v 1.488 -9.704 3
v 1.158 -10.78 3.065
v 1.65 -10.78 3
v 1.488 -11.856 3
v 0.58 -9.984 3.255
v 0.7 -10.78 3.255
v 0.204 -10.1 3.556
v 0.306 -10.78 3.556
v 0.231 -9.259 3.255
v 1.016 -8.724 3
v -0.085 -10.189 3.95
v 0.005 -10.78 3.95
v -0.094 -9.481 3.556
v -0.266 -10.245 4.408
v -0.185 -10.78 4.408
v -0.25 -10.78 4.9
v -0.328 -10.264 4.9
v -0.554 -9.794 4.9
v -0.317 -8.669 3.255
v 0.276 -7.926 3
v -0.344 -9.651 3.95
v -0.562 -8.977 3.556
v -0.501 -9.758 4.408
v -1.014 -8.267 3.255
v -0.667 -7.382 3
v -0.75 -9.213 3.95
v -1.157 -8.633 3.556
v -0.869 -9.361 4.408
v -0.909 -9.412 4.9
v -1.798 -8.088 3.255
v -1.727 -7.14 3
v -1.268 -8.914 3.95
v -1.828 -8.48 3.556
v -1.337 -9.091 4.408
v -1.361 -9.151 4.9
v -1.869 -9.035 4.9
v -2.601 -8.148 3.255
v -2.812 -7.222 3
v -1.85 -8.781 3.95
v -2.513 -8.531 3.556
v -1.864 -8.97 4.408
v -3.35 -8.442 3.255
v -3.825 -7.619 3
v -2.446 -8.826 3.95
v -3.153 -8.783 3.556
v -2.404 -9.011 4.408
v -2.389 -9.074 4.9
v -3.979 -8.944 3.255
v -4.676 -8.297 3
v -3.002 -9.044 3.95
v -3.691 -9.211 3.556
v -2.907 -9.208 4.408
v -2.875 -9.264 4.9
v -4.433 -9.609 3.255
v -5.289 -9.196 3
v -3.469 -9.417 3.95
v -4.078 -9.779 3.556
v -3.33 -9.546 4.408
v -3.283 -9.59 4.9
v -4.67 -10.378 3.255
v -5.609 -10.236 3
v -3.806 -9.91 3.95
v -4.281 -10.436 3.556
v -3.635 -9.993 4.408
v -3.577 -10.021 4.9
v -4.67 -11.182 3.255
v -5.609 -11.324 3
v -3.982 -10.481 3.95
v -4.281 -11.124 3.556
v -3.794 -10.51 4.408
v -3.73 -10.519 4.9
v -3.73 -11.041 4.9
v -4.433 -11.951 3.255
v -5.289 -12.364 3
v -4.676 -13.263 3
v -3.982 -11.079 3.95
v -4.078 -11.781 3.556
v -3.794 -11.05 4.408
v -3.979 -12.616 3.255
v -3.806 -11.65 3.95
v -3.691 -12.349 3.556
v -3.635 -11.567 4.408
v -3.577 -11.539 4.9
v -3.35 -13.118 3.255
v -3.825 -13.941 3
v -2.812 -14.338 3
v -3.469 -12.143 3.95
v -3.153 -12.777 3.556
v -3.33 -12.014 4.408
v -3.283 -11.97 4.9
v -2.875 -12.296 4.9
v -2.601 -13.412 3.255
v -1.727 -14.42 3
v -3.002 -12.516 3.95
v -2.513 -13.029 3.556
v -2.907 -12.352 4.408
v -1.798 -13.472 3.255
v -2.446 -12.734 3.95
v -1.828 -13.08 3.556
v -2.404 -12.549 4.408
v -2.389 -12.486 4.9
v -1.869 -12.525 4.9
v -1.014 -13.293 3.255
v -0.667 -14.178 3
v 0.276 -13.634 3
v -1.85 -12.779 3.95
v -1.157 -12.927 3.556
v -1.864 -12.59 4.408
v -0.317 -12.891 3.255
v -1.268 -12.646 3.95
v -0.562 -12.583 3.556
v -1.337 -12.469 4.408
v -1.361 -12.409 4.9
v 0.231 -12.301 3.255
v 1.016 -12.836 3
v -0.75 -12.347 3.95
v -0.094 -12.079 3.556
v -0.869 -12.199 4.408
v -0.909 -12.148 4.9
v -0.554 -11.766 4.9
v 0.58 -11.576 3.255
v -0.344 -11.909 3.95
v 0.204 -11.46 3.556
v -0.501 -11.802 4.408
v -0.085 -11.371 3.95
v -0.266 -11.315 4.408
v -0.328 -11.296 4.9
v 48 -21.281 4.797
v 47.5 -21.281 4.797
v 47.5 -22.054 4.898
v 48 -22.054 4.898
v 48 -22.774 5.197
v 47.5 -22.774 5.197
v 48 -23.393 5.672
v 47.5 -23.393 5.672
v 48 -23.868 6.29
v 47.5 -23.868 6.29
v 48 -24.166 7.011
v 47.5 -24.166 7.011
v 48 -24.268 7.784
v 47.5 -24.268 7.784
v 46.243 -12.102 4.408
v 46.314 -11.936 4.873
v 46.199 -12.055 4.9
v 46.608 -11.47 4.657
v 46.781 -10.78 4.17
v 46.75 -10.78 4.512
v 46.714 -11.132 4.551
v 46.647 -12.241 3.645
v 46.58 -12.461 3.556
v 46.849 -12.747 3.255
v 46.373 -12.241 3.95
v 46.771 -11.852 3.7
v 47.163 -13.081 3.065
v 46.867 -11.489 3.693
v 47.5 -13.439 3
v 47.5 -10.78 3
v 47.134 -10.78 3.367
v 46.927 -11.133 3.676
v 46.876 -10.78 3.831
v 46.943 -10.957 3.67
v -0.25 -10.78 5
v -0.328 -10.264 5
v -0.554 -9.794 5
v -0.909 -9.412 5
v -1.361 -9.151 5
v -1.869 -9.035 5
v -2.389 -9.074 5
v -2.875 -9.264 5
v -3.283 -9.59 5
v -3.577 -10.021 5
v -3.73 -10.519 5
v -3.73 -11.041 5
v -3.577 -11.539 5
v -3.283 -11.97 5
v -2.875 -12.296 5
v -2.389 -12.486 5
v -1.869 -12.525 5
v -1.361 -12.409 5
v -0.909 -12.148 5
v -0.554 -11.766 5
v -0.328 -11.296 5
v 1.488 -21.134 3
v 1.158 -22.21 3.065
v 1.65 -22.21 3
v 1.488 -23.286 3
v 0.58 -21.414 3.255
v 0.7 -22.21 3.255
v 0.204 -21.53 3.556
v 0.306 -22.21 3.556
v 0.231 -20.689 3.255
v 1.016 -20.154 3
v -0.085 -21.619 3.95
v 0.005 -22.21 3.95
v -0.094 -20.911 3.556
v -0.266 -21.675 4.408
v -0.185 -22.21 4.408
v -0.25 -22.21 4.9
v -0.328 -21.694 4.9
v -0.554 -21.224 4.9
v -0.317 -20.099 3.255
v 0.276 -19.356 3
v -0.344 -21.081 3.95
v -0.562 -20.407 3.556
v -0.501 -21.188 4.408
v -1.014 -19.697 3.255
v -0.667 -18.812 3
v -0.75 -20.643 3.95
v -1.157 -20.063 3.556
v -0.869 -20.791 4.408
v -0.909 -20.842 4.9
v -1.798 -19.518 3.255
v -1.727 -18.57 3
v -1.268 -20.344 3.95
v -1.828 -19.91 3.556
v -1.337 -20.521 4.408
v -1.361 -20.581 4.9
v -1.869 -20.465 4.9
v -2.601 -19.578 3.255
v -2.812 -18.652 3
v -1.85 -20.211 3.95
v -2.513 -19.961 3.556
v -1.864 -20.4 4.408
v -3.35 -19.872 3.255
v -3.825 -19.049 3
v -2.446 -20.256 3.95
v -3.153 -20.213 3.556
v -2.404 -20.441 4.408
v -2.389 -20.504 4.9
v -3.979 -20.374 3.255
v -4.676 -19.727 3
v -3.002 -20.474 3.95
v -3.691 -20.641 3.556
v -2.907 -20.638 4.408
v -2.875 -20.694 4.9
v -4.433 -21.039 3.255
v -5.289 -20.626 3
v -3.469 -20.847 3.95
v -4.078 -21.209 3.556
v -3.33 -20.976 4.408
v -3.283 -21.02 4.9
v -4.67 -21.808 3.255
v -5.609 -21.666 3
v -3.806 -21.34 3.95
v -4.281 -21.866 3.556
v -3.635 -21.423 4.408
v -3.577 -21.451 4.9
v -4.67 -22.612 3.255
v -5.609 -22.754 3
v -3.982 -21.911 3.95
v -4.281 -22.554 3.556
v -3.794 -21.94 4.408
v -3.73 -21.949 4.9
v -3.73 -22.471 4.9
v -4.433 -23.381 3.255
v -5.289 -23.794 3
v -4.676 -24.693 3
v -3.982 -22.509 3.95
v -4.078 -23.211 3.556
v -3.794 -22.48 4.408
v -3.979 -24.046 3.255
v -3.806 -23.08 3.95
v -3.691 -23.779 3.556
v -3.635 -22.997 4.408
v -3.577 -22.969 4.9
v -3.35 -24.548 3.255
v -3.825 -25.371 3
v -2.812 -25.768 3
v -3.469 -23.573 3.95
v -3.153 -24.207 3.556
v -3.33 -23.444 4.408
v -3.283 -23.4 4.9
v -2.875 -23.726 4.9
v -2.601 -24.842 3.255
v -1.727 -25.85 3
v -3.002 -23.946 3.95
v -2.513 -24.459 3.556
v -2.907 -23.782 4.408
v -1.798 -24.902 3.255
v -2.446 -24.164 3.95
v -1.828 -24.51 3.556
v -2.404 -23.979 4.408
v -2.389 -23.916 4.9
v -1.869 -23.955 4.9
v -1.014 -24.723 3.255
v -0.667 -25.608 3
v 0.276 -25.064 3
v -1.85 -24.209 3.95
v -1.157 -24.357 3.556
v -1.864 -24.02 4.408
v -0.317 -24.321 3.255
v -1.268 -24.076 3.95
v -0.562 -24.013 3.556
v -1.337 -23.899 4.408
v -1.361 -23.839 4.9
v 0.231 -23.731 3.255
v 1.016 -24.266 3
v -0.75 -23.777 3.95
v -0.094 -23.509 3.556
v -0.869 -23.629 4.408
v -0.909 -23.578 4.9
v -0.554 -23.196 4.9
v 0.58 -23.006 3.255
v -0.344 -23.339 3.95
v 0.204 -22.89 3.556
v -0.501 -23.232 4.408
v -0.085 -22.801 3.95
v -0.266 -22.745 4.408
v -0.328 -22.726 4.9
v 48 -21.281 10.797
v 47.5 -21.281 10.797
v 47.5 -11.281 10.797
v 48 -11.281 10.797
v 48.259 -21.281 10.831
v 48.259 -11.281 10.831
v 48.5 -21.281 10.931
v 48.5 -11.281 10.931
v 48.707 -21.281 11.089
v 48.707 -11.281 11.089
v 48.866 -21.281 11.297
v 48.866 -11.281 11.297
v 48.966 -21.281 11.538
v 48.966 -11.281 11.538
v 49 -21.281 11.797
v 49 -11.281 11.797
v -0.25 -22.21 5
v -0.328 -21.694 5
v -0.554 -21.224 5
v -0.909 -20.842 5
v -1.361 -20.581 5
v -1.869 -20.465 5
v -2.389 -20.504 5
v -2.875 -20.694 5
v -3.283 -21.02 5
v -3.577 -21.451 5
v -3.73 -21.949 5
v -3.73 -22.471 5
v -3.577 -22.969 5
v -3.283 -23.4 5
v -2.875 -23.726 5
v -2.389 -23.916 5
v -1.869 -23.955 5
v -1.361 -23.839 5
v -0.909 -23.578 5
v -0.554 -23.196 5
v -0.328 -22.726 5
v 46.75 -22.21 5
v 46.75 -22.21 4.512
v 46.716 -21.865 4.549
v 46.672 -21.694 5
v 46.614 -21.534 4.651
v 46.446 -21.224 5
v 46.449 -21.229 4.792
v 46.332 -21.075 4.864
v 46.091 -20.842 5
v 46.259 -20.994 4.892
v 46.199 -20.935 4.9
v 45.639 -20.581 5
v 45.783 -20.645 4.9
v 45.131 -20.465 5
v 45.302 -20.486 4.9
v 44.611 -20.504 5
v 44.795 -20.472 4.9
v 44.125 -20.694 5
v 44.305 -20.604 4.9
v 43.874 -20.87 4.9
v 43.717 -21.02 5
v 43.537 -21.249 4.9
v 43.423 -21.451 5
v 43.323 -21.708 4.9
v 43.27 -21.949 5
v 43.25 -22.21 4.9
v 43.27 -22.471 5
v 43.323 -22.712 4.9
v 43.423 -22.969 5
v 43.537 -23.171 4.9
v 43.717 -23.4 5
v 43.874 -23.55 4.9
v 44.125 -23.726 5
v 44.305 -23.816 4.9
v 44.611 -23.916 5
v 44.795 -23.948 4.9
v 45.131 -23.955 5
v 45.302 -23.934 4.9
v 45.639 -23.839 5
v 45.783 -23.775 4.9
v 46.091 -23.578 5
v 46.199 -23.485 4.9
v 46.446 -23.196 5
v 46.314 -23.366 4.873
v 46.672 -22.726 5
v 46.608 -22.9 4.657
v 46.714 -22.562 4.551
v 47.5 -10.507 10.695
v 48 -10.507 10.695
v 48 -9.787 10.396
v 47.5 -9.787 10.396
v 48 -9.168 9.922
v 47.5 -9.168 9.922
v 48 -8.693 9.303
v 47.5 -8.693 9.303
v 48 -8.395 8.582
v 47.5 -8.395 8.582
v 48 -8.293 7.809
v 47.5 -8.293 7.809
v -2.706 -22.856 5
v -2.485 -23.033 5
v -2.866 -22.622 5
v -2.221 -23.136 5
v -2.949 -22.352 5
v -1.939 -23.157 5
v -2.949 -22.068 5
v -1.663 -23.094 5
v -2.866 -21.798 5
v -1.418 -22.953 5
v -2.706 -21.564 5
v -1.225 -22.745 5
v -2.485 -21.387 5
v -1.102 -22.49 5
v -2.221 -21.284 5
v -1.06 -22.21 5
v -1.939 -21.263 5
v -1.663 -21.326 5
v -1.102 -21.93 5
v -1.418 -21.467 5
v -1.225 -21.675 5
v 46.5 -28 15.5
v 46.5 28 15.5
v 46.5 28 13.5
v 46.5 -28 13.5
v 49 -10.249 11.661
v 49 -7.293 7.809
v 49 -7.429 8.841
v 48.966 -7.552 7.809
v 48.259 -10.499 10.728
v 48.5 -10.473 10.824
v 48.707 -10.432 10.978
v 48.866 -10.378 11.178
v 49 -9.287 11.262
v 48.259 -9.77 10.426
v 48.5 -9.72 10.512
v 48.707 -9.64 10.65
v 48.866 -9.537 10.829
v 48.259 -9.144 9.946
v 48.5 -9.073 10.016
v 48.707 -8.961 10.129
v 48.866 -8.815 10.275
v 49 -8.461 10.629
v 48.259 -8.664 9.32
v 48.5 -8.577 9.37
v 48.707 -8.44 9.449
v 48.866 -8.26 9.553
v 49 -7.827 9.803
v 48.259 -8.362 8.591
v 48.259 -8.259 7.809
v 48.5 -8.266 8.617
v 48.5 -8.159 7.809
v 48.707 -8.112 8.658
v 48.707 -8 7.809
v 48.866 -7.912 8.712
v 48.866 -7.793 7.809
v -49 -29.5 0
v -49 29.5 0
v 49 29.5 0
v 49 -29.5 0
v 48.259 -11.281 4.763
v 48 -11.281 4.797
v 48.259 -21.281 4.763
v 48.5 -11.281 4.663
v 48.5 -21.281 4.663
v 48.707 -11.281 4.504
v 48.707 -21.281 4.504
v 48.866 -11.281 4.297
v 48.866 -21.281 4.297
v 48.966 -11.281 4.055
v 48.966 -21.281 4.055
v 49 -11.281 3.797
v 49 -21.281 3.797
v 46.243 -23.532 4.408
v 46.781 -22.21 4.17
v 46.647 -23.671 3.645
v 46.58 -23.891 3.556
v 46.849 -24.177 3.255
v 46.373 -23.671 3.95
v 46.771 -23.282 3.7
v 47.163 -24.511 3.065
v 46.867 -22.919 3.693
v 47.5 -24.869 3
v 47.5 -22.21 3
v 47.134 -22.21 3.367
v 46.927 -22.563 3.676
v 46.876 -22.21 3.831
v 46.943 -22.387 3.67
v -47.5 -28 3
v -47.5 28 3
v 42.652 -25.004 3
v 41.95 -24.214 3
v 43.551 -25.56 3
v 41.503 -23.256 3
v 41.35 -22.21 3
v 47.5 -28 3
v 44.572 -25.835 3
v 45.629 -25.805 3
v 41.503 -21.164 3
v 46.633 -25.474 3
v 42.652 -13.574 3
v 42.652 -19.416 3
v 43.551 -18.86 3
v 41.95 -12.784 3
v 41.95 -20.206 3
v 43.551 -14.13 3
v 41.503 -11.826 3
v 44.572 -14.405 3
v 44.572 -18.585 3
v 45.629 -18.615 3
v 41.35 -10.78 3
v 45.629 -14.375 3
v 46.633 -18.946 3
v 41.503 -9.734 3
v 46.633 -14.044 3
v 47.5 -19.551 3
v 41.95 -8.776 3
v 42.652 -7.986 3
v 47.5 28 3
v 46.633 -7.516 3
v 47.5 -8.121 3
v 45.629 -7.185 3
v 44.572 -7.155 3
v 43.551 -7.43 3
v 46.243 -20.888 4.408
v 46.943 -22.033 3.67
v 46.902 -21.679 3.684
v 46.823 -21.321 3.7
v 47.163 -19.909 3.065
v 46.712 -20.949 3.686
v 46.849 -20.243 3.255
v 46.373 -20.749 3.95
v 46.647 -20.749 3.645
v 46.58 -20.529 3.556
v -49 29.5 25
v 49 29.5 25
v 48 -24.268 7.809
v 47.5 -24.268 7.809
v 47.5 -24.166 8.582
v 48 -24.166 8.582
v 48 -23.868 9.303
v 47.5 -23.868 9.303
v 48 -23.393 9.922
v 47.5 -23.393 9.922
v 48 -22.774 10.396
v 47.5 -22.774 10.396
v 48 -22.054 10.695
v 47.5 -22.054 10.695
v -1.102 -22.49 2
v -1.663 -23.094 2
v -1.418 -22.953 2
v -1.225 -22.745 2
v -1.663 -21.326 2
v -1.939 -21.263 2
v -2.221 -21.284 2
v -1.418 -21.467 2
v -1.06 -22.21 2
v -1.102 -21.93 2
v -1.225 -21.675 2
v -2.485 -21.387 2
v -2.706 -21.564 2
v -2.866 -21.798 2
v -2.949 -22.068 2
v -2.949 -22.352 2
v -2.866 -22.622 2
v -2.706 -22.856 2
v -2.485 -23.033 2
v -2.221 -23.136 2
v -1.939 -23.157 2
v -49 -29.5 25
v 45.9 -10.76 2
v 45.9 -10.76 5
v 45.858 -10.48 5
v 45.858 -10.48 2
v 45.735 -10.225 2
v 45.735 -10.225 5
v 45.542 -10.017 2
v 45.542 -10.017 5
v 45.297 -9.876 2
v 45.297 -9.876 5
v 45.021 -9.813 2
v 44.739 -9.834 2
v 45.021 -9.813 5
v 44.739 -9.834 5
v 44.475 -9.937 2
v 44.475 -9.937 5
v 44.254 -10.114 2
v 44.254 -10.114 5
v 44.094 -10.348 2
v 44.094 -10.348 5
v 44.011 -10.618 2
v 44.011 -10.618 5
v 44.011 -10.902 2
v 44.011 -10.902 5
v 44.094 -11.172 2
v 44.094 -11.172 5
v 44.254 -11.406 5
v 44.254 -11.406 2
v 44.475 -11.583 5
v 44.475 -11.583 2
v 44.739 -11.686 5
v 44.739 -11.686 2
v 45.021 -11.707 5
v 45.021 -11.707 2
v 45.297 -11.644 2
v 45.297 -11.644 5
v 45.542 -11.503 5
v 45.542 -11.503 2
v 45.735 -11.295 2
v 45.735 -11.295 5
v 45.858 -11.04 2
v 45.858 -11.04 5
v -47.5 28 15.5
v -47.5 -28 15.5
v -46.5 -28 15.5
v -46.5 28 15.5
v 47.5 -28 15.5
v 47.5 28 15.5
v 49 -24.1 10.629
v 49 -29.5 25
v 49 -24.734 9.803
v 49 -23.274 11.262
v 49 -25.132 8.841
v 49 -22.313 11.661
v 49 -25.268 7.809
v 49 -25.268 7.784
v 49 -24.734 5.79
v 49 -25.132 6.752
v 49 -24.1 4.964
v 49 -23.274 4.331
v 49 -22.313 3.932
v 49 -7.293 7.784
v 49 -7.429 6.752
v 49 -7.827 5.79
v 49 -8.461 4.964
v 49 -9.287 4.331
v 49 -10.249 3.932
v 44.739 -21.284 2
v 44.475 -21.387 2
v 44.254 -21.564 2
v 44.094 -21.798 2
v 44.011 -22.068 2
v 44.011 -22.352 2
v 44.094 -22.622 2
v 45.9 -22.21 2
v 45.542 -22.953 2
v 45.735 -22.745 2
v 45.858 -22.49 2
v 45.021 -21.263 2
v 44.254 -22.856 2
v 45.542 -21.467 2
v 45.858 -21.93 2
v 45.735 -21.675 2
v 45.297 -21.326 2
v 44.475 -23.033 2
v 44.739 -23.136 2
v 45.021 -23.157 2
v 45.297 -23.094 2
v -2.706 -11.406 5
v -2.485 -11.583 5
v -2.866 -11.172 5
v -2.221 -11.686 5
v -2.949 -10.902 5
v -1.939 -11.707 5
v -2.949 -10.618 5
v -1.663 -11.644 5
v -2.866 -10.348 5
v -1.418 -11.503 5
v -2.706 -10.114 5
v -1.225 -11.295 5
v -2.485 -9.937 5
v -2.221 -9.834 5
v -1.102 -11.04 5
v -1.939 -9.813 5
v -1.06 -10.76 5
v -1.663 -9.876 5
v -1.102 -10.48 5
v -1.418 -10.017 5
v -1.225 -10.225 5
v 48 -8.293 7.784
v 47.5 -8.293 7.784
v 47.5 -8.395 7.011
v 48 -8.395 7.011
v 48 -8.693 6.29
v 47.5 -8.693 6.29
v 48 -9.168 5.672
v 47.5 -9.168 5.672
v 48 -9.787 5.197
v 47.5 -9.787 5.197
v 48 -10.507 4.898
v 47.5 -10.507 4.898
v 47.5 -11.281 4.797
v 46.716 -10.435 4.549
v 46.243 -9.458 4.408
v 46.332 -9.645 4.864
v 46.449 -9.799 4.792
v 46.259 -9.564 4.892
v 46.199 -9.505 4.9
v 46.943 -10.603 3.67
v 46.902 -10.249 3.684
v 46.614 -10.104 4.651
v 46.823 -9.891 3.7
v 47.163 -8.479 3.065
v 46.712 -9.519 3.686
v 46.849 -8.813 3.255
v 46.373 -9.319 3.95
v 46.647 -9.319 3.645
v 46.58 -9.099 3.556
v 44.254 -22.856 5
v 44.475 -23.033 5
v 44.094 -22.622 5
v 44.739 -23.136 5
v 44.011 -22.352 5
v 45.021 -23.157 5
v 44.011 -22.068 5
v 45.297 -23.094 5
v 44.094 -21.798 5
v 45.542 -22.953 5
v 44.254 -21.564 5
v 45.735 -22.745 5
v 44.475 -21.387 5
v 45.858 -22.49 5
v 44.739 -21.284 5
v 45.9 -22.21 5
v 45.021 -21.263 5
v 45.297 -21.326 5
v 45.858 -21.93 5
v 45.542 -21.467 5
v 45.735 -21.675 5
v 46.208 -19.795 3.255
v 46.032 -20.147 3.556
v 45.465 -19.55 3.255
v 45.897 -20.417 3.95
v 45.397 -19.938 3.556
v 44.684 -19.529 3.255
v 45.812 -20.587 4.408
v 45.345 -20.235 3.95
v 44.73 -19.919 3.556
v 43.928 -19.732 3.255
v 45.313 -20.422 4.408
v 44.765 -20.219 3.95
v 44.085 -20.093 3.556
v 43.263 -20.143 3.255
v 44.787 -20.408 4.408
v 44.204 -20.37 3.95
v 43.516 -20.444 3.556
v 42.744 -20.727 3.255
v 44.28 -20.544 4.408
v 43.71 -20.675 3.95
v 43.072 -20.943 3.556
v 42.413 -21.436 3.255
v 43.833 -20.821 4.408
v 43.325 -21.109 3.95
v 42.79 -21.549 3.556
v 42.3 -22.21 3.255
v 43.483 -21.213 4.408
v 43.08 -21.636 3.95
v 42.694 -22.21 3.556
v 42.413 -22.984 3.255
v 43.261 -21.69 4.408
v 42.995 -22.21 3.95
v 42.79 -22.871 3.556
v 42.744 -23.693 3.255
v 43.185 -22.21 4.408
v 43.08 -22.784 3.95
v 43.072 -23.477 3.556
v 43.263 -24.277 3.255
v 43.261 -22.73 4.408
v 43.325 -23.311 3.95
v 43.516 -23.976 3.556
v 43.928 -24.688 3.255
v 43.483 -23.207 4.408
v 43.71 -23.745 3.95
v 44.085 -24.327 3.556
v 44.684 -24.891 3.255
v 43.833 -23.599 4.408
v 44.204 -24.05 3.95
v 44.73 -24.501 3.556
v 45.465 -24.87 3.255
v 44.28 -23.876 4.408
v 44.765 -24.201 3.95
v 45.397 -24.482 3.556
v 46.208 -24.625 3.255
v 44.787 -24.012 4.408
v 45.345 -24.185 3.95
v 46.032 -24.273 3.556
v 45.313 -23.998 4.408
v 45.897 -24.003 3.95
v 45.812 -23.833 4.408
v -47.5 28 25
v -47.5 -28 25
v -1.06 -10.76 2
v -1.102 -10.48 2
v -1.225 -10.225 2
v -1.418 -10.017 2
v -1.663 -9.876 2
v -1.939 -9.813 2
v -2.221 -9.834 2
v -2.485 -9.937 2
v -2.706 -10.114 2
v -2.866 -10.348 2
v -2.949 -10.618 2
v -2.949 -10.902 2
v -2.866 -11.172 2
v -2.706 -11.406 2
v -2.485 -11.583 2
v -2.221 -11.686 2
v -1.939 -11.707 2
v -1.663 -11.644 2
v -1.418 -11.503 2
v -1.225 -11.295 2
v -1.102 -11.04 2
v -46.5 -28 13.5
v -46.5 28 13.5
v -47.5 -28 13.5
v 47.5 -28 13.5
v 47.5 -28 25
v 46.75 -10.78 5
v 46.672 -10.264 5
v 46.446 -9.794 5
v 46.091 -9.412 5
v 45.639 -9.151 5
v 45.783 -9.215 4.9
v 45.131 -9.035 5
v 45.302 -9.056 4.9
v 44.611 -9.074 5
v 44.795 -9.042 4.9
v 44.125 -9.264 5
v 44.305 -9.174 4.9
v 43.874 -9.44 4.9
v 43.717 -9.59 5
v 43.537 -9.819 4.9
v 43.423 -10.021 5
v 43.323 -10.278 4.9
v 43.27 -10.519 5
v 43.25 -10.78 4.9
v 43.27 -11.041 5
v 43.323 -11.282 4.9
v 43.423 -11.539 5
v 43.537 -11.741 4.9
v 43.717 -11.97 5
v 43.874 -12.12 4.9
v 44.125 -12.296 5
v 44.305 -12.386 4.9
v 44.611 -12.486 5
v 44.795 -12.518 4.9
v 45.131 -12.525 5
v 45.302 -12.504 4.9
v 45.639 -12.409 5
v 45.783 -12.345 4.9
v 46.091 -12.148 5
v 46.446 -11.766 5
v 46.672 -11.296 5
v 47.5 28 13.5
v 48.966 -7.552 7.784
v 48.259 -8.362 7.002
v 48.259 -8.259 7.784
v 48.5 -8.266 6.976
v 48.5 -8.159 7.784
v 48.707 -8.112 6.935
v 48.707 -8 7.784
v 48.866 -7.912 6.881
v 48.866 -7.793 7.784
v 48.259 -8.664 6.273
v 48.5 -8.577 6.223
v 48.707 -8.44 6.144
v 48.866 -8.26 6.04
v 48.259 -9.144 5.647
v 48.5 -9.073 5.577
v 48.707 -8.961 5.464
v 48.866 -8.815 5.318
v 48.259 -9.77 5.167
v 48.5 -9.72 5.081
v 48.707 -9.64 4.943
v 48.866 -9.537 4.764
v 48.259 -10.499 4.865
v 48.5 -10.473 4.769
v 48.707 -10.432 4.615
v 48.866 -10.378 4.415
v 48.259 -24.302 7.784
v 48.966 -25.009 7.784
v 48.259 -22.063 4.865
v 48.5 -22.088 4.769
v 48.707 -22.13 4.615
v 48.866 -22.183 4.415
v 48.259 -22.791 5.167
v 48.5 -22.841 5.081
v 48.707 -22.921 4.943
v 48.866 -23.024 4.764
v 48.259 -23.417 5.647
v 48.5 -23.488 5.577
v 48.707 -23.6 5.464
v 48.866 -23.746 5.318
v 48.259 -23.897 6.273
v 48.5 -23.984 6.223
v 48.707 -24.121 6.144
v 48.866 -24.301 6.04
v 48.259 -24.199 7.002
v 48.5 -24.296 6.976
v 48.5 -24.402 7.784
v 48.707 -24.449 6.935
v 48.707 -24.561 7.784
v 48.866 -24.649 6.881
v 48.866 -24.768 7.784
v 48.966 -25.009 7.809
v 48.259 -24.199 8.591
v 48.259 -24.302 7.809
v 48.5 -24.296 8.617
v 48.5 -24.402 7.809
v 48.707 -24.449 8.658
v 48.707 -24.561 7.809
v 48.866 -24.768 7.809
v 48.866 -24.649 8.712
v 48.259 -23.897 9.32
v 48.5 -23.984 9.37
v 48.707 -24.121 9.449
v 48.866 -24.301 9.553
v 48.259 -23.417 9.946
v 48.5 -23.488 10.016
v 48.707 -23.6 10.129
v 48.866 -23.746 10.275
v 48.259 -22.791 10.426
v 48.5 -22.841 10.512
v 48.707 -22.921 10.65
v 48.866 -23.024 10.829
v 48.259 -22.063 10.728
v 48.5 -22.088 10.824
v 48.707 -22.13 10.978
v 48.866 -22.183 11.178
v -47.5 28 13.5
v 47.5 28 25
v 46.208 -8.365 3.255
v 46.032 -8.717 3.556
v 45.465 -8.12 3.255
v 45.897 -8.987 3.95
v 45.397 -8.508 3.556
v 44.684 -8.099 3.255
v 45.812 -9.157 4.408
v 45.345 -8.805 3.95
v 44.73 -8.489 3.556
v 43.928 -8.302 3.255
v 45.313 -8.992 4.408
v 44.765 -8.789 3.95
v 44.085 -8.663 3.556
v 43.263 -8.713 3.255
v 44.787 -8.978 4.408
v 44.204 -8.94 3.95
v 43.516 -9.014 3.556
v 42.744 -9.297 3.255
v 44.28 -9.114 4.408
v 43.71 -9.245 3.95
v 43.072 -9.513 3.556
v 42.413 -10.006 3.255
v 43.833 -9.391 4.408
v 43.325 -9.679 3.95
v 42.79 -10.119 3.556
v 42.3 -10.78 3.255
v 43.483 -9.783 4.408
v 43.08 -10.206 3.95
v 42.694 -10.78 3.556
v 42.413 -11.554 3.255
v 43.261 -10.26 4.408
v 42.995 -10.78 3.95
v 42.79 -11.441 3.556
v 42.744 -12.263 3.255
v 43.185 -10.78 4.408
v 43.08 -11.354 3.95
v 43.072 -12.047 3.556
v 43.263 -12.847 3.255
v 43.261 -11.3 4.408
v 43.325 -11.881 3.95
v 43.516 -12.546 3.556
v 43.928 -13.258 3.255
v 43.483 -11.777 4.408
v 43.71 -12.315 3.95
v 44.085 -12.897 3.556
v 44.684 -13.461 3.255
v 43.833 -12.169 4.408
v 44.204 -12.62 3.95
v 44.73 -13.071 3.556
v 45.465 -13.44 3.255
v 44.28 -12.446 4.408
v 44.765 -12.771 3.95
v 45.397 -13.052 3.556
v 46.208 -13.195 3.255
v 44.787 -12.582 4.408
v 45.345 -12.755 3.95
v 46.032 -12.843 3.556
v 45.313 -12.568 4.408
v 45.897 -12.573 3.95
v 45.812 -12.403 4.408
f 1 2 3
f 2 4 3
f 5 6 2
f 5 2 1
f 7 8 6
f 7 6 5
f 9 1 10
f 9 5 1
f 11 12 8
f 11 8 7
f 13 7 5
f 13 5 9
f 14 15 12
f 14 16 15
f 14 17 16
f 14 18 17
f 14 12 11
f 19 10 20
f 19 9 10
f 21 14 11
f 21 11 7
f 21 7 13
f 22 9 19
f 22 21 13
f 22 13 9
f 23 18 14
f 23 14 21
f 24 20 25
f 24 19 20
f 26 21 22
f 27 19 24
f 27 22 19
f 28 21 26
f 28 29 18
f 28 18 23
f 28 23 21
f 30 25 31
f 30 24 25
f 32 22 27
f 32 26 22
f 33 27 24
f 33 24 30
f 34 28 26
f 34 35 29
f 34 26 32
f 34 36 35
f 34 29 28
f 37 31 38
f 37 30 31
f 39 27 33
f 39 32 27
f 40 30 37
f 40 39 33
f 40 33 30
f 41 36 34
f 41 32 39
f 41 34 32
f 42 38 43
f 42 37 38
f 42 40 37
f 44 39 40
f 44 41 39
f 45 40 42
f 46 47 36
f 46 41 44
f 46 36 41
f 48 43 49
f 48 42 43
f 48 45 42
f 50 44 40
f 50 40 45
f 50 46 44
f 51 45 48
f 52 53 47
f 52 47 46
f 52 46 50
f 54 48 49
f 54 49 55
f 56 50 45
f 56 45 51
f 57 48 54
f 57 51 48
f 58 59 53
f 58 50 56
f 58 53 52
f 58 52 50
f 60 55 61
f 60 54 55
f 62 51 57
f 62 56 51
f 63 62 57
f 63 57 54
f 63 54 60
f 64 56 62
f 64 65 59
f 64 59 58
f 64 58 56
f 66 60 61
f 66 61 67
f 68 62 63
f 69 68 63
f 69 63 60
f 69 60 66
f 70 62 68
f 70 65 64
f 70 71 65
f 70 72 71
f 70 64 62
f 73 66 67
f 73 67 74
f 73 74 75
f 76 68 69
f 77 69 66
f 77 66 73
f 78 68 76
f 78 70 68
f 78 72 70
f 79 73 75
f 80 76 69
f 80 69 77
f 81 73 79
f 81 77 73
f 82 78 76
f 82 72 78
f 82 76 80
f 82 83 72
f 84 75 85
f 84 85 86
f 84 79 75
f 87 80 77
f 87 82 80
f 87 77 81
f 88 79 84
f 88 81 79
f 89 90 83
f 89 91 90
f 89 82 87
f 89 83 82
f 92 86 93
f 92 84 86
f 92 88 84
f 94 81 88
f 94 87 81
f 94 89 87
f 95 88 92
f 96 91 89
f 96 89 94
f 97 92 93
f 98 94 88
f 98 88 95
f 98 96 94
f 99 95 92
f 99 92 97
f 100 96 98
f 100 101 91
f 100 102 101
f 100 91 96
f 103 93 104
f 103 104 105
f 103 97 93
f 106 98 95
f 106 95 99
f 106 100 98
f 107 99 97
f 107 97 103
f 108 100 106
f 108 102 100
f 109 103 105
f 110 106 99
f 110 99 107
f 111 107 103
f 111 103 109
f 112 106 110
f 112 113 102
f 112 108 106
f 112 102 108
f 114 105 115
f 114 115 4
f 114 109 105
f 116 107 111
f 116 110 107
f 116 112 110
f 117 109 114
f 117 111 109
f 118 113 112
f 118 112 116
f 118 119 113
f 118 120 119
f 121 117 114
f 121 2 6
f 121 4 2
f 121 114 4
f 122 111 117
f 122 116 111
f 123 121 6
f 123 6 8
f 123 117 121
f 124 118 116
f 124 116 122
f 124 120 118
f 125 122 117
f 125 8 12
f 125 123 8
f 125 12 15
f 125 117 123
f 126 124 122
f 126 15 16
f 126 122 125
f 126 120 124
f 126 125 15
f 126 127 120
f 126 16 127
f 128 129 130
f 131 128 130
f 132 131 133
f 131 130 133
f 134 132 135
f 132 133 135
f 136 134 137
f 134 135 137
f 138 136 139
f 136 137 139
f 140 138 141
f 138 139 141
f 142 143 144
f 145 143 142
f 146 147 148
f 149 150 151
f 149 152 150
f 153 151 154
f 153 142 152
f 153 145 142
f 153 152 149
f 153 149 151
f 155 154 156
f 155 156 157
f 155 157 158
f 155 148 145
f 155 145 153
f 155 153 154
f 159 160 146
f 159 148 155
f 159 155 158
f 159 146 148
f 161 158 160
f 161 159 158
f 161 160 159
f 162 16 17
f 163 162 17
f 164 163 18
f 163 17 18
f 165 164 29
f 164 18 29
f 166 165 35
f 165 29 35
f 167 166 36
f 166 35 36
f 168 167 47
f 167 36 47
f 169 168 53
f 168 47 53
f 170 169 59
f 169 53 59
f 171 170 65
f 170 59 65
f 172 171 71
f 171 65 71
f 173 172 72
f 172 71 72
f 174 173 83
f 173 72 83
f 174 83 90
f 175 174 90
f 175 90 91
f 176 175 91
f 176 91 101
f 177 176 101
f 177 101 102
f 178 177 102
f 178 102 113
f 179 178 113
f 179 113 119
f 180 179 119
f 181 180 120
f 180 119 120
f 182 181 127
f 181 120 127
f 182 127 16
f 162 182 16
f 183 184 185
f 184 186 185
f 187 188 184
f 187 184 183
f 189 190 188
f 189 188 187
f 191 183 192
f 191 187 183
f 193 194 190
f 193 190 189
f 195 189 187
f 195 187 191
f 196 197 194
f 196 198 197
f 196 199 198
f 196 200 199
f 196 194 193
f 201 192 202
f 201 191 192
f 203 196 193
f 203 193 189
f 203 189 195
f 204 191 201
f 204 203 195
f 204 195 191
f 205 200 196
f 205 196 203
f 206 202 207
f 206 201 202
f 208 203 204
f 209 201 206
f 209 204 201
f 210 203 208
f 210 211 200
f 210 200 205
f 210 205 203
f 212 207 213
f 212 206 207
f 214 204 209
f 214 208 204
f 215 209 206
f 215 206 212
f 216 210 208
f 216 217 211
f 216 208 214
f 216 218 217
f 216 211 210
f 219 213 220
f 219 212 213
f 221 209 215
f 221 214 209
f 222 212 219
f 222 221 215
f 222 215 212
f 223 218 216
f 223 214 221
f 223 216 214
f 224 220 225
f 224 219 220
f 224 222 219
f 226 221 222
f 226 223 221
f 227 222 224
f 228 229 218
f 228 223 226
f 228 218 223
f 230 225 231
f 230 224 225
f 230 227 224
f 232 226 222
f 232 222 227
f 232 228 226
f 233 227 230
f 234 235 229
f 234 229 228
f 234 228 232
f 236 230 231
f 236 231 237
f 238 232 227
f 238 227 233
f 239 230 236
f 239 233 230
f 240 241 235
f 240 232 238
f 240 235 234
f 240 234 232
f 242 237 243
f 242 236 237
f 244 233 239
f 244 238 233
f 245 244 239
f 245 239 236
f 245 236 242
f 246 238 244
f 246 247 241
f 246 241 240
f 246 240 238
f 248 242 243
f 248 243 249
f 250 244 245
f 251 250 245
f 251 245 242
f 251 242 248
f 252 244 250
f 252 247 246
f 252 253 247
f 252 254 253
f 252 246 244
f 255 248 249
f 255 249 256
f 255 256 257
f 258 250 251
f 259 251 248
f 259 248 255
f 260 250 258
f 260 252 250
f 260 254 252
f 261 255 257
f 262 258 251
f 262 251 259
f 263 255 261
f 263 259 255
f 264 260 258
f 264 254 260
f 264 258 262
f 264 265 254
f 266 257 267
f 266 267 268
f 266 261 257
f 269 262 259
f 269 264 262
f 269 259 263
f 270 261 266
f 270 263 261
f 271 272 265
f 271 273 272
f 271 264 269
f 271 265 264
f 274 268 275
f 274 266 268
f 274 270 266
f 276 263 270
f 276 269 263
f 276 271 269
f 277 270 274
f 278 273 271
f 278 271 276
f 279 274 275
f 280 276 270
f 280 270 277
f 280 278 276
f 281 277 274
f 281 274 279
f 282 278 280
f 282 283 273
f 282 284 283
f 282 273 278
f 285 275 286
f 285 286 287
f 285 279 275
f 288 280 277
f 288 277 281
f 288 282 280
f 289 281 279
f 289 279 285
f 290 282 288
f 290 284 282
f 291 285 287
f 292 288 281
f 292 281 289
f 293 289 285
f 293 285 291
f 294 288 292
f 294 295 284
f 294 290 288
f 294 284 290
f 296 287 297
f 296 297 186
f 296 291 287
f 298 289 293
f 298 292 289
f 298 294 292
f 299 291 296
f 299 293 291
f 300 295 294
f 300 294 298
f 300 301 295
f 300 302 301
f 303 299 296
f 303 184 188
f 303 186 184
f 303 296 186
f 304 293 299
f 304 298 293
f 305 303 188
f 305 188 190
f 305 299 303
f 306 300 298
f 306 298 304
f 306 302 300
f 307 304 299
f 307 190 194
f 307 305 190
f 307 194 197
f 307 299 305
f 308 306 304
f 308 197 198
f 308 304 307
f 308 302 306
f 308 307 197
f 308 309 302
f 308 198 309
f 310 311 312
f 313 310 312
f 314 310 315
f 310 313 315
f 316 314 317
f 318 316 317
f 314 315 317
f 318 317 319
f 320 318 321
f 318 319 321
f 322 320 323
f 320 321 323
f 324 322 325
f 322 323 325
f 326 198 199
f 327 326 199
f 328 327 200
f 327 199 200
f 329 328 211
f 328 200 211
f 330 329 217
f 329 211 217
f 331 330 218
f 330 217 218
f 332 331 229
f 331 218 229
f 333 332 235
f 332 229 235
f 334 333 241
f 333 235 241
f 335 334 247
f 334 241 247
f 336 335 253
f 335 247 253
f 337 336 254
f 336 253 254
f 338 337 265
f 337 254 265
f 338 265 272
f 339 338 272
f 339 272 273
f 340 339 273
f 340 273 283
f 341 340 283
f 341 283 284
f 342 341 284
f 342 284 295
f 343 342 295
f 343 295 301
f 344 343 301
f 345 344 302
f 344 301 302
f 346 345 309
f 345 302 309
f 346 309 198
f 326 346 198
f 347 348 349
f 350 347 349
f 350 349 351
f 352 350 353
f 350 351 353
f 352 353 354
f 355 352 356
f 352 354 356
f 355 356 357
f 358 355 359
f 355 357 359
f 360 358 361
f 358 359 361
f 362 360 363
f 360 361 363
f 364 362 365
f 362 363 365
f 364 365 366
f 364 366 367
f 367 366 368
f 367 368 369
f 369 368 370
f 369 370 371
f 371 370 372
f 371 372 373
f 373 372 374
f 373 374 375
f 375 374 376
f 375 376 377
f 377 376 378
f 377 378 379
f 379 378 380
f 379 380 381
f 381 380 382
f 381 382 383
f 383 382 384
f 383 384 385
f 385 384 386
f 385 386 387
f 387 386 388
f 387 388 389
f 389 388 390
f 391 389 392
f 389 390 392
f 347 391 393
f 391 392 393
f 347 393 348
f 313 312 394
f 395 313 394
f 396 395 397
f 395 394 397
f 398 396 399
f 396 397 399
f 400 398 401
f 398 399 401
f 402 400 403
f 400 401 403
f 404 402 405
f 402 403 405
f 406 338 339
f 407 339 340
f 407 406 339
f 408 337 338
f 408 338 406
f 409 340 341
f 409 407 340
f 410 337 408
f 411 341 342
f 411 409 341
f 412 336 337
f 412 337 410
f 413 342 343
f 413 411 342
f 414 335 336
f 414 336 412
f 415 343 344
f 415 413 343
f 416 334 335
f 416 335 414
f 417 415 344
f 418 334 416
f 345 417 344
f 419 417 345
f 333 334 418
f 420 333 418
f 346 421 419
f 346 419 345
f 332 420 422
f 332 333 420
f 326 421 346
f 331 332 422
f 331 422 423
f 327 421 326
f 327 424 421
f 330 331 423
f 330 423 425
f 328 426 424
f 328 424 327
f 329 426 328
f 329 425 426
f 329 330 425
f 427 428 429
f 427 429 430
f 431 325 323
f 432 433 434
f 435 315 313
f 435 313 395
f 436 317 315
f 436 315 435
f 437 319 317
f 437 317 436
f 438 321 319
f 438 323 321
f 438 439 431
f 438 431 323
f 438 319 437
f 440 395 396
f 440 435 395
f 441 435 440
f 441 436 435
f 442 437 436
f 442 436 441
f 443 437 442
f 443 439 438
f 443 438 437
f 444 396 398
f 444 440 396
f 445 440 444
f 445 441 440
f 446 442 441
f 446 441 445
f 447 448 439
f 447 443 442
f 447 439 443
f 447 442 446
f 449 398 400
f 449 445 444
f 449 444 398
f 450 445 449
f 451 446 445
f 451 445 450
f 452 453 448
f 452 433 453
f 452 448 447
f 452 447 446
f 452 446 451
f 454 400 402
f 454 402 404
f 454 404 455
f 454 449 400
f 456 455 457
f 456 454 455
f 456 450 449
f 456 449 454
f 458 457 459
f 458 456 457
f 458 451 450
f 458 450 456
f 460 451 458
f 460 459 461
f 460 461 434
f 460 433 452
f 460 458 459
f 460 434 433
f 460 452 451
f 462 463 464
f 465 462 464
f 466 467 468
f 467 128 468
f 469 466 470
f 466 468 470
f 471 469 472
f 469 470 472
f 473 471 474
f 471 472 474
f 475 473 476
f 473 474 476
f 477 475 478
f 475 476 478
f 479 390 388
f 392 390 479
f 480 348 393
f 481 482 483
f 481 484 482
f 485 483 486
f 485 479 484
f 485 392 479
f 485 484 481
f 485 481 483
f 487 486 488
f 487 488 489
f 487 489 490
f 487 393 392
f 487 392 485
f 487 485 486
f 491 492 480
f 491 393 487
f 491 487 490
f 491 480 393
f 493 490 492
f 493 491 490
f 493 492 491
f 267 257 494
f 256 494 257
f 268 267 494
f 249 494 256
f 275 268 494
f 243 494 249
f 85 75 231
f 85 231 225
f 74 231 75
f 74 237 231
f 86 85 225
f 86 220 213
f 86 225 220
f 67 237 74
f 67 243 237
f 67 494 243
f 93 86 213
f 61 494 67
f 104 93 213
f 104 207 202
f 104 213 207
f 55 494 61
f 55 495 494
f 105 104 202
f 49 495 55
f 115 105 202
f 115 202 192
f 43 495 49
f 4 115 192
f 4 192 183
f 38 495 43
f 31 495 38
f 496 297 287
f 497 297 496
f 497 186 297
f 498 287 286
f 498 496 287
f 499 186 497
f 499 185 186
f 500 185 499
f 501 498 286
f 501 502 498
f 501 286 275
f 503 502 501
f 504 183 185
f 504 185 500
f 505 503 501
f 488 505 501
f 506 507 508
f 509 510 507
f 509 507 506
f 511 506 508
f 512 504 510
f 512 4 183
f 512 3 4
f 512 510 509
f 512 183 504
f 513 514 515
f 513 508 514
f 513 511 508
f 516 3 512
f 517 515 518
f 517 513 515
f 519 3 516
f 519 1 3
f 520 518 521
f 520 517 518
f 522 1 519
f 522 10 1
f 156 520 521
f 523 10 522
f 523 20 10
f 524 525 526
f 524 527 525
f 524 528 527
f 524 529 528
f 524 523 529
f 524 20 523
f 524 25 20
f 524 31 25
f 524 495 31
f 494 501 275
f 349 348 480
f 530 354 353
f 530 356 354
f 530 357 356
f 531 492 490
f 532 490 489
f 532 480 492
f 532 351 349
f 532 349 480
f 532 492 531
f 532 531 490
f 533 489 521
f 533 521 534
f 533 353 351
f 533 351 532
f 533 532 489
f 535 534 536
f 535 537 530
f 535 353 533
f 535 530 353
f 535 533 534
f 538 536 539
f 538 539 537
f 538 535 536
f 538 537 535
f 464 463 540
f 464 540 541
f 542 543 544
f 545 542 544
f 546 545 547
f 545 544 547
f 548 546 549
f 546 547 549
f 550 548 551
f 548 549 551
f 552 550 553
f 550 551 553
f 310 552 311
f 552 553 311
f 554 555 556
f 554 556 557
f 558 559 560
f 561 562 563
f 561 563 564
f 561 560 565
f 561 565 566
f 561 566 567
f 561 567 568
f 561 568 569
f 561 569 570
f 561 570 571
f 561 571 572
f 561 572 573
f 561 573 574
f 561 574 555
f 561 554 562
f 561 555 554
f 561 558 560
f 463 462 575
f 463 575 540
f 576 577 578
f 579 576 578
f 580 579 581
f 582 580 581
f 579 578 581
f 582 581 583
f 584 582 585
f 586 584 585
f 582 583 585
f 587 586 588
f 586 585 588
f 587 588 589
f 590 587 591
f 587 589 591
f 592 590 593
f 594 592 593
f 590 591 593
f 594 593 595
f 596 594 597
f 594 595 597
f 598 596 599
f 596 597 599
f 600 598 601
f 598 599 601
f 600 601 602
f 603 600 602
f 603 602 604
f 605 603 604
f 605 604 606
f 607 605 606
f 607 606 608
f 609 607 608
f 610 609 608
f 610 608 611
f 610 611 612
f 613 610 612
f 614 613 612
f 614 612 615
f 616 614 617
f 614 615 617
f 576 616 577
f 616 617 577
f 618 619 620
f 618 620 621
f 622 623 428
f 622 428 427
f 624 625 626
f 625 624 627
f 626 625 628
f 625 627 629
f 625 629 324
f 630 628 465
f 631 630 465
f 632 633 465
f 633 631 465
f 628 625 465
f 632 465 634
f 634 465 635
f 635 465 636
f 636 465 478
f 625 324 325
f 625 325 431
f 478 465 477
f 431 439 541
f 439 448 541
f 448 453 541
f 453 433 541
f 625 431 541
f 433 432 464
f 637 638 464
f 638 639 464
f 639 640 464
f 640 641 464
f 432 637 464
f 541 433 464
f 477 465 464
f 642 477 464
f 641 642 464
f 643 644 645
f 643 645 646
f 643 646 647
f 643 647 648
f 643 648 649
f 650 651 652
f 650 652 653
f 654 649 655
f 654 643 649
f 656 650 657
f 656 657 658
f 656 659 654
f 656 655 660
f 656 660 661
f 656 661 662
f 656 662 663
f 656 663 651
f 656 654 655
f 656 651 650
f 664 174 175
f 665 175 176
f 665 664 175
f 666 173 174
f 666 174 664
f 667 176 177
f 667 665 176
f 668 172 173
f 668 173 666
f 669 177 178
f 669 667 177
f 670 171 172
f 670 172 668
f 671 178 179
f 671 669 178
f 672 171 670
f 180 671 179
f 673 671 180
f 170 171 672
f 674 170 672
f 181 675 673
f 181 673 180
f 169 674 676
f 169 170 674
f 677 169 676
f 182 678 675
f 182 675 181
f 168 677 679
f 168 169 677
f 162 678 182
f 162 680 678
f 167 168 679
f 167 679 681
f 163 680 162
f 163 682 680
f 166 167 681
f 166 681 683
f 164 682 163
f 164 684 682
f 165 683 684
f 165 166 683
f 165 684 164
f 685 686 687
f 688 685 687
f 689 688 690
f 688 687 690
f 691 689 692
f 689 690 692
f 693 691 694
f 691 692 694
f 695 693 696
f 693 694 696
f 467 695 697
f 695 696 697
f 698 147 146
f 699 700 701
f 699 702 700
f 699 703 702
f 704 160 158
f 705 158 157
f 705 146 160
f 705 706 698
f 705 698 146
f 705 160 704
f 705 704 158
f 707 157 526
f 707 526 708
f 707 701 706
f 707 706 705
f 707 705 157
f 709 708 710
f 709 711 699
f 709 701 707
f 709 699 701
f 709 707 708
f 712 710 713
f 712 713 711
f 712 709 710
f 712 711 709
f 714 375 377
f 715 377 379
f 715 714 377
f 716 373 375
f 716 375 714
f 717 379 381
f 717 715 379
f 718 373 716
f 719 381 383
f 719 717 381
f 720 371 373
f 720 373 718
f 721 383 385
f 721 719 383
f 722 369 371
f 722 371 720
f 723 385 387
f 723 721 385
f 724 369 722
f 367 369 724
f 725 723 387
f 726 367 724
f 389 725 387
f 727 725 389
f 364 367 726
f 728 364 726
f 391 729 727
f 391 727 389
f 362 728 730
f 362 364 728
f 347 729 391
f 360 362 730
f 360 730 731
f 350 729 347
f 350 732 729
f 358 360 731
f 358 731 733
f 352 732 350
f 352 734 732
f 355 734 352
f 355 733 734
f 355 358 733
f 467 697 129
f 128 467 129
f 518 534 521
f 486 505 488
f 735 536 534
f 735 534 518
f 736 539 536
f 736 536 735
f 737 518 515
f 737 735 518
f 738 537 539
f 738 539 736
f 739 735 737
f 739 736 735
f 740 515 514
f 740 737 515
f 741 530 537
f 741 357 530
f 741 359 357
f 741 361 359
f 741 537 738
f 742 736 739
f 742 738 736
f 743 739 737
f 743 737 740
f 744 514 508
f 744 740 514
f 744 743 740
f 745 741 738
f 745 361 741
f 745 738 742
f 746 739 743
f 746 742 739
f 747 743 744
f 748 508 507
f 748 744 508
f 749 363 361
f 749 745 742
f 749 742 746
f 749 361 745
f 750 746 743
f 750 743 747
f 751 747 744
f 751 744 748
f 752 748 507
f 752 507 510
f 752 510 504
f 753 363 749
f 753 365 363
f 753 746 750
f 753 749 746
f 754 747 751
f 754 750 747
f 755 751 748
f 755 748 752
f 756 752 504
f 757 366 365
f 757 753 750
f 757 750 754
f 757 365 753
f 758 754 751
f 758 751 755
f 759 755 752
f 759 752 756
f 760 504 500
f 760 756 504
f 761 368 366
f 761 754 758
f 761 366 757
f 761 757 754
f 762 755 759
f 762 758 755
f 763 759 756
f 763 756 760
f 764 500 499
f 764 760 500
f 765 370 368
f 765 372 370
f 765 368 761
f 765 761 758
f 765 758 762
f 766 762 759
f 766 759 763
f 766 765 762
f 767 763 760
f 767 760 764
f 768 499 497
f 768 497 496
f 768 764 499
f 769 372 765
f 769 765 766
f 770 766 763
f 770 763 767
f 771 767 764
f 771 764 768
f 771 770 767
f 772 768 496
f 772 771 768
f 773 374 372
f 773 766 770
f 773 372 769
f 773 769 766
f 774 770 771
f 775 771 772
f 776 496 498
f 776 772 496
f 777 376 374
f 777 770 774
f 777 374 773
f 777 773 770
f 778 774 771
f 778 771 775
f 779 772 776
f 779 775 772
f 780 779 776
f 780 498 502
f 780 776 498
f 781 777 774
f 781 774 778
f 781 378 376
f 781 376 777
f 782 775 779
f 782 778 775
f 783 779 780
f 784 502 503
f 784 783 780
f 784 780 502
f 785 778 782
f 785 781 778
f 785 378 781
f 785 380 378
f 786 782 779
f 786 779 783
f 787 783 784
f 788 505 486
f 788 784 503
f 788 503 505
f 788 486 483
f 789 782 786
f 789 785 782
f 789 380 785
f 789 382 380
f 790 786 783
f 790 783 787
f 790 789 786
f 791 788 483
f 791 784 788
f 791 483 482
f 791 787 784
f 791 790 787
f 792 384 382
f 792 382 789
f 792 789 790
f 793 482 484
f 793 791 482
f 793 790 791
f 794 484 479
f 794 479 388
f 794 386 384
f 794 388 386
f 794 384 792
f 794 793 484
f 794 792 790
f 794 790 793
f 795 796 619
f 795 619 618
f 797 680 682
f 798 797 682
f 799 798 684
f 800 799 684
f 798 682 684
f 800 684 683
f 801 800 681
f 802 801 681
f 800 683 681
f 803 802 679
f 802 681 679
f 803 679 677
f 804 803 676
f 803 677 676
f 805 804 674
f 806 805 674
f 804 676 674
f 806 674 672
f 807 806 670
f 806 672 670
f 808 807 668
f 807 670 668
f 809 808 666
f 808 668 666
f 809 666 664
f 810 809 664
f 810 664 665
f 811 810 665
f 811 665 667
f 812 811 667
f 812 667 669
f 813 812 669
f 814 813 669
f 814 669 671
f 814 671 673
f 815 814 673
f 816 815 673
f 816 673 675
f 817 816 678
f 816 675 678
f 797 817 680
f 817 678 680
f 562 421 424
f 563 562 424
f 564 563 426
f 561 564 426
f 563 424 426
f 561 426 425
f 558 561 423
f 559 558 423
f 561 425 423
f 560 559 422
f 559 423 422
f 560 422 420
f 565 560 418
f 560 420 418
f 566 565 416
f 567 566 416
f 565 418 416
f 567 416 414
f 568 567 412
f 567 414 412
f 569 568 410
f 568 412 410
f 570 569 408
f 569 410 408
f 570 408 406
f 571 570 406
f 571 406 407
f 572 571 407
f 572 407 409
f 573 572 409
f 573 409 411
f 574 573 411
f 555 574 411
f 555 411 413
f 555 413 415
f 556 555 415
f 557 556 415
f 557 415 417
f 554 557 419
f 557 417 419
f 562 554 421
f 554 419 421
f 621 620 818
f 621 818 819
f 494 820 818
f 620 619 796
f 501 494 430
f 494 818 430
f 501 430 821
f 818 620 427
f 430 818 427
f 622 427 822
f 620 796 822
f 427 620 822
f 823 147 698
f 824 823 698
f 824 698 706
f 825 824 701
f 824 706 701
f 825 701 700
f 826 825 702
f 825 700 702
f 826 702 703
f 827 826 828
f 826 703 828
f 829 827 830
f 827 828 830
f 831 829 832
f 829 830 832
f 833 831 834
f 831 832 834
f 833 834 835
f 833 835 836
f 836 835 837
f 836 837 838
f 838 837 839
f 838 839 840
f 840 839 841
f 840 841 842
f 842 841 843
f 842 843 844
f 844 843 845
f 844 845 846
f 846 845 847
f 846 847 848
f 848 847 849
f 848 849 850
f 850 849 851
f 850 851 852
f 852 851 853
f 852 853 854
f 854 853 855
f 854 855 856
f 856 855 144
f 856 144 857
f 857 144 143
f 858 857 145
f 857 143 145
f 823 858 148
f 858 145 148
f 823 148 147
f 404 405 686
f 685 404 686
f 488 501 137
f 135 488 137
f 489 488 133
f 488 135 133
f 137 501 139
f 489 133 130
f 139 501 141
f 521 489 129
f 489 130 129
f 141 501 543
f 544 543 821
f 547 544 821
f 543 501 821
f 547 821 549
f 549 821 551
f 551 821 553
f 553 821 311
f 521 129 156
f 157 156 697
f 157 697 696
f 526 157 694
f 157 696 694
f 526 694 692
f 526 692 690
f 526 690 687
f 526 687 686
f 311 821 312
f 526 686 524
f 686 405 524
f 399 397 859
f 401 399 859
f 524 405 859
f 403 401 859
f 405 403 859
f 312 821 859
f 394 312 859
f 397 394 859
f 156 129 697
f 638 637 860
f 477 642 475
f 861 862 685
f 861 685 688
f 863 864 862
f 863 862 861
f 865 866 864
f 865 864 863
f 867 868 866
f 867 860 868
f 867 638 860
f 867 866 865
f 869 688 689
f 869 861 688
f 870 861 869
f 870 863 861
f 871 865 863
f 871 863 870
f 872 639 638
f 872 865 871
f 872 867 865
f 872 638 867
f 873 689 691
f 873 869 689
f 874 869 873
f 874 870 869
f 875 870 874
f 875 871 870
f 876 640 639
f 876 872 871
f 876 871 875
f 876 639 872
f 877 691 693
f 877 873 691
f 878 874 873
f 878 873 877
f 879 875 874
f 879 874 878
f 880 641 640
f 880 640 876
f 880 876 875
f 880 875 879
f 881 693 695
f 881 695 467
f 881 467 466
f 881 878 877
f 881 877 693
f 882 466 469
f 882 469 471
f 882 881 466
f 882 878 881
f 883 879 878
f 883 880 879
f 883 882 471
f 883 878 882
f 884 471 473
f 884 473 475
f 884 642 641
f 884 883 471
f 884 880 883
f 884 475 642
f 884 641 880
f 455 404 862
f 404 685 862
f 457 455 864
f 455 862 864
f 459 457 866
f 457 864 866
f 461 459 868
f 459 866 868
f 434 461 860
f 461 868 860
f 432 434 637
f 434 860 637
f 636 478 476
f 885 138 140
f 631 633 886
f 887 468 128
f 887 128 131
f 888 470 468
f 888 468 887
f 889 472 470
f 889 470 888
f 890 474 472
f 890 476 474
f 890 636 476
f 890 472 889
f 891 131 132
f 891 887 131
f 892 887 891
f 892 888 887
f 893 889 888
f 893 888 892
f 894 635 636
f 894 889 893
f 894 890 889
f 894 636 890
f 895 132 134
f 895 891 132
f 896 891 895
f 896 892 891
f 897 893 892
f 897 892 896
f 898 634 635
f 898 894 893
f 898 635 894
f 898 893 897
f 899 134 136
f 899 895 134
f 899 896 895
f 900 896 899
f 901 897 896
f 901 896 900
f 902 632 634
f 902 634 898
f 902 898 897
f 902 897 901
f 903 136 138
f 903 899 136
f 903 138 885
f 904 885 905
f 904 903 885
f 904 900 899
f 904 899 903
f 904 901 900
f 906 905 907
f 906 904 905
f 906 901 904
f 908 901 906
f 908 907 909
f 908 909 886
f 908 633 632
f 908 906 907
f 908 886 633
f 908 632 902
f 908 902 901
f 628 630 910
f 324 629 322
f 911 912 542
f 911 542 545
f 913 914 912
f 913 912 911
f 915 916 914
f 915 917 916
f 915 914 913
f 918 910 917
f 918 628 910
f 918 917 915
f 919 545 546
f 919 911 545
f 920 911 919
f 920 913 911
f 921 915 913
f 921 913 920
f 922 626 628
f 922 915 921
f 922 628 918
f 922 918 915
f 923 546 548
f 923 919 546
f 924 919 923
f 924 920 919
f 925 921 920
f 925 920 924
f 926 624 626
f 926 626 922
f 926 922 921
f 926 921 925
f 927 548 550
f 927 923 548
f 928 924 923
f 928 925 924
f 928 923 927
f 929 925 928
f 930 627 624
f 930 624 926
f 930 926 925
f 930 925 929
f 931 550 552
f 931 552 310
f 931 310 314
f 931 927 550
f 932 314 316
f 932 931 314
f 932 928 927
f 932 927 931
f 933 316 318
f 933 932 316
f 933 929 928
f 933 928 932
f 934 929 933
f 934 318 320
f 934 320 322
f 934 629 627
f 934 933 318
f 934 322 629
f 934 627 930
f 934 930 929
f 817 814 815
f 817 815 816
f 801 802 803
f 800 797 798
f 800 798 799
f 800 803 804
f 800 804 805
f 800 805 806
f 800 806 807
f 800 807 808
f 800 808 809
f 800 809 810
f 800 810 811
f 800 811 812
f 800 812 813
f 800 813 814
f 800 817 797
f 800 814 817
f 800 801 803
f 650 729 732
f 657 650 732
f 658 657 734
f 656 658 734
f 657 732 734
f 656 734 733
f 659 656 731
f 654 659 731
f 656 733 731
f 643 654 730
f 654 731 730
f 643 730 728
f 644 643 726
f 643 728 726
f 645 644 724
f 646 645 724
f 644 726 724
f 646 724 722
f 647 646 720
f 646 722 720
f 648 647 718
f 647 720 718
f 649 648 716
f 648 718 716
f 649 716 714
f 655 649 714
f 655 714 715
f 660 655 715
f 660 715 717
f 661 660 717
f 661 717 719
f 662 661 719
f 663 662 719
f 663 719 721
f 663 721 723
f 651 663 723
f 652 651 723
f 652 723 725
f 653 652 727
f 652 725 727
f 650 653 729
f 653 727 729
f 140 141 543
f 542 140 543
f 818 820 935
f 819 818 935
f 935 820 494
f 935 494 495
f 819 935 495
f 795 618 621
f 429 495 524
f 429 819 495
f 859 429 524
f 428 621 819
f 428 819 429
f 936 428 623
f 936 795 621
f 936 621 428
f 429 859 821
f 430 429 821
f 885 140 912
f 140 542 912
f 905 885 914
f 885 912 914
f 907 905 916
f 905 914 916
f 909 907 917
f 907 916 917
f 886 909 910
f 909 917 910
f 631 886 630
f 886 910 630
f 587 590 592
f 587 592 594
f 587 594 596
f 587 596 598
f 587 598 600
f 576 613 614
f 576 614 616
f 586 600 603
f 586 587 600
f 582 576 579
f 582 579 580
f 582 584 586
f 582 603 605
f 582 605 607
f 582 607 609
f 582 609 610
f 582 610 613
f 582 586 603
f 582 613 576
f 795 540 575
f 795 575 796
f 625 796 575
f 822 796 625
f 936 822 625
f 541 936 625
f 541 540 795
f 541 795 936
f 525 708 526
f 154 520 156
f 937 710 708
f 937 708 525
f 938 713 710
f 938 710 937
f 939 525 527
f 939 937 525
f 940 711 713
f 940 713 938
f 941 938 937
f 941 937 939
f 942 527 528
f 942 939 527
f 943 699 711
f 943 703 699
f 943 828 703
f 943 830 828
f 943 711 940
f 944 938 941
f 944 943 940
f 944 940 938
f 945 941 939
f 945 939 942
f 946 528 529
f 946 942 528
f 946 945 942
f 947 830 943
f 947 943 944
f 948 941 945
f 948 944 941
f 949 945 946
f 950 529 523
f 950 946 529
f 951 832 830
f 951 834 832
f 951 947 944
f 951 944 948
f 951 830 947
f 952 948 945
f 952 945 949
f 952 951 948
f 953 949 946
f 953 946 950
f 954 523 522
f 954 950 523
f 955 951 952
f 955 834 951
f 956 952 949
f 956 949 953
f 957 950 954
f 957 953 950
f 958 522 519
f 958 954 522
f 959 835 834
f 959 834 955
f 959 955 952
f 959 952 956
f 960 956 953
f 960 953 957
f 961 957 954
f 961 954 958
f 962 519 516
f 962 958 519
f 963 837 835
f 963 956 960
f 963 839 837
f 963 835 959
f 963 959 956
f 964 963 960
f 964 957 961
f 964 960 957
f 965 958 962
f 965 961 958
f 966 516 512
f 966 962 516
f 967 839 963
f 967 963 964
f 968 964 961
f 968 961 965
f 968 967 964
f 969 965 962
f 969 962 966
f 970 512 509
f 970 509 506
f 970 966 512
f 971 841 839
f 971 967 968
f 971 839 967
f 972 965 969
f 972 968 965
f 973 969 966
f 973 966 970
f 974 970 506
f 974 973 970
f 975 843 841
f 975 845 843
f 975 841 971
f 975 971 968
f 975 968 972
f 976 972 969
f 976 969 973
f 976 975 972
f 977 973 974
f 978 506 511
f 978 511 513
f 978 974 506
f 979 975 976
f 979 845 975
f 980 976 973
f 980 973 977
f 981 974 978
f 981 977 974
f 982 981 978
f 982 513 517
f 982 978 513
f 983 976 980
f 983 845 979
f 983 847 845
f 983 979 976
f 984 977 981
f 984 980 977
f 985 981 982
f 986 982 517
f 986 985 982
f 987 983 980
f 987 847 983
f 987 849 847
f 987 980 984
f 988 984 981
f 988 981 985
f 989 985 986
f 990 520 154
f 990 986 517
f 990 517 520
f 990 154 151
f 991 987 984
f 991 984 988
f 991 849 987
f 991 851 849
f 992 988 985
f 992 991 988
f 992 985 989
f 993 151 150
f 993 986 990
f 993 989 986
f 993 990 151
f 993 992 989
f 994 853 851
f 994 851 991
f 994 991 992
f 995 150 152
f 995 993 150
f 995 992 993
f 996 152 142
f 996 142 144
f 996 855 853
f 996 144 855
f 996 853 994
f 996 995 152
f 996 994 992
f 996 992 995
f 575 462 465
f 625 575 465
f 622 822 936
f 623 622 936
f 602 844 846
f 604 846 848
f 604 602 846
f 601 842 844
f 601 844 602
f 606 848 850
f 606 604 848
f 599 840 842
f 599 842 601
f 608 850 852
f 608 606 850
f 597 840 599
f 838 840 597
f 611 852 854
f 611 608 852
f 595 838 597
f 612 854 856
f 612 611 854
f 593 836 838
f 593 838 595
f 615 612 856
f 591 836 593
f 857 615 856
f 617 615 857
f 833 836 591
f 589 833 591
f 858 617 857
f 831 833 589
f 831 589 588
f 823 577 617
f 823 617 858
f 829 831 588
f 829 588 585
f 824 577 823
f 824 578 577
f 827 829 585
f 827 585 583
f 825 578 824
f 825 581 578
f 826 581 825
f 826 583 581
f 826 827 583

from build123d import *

# Parameters (mm, degrees)
SKETCH027_W     = 98
SKETCH027_H     = 59
PAD014_DEPTH    = 25
SKETCH028_W     = 95
SKETCH028_H     = 56
POCKET008_DEPTH = 22
SKETCH029_W     = 56
SKETCH029_H     = 2
PAD015_DEPTH    = 1
SKETCH030_W     = 56.025157
SKETCH030_H     = 2
PAD016_DEPTH    = 1
SKETCH031_R     = 1.75
PAD017_DEPTH    = 2
SKETCH032_R     = 0.95
POCKET009_DEPTH = 3
FILLET003_R     = 1.9
POCKET010_DEPTH = 3
FILLET004_R     = 1


with BuildPart() as part:
    # Sketch027 → Pad014 (new body)
    with BuildSketch(Plane.XY):
        Rectangle(SKETCH027_W, SKETCH027_H)
    extrude(amount=PAD014_DEPTH)

    # Sketch028 (on Face6 of Pad014) → Pocket008 (cut)
    with BuildSketch(Plane.XY.offset(25)):
        Rectangle(SKETCH028_W, SKETCH028_H)
    extrude(amount=-POCKET008_DEPTH, mode=Mode.SUBTRACT)

    # Sketch029 (on Face9 of Pocket008) → Pad015 (join)
    with BuildSketch(Plane.YZ.offset(-47.5)):
        with Locations((0, 14.5)):
            Rectangle(SKETCH029_W, SKETCH029_H)
    extrude(amount=PAD015_DEPTH)

    # Sketch030 (on Face7 of Pad015) → Pad016 (join)
    with BuildSketch(Plane(origin=(47.5, 0, 0), x_dir=(0, -1, 0), z_dir=(-1, 0, 0))):
        with Locations((0.0125785, 14.5)):
            Rectangle(SKETCH030_W, SKETCH030_H)
    extrude(amount=PAD016_DEPTH)

    # Sketch031 (on Face16 of Pad016) → Pad017 (join)
    with BuildSketch(Plane.XY.offset(3)):
        with Locations((-2, -10.78)):
            Circle(SKETCH031_R)
        with Locations((45, -10.78)):
            Circle(SKETCH031_R)
        with Locations((45, -22.21)):
            Circle(SKETCH031_R)
        with Locations((-2, -22.21)):
            Circle(SKETCH031_R)
    extrude(amount=PAD017_DEPTH)

    # Sketch032 (on Face26 of Pad017) → Pocket009 (cut)
    with BuildSketch(Plane.XY.offset(5)):
        with Locations((-2.01, -10.76)):
            Circle(SKETCH032_R)
        with Locations((-2.01, -22.21)):
            Circle(SKETCH032_R)
        with Locations((44.95, -22.21)):
            Circle(SKETCH032_R)
        with Locations((44.95, -10.76)):
            Circle(SKETCH032_R)
    extrude(amount=-POCKET009_DEPTH, mode=Mode.SUBTRACT)

    # Fillet003
    fillet003_edges = [part.edges().sort_by_distance(p)[0] for p in [
        (-3.75, -10.78, 3),
        (-3.75, -22.21, 3),
        (43.25, -10.78, 3),
        (43.25, -22.21, 3),
    ]]
    fillet(fillet003_edges, radius=FILLET003_R)

    # Sketch033 (on Face2 of Fillet003) → Pocket010 (cut)
    with BuildSketch(Plane(origin=(47.5, 0, 0), x_dir=(0, -1, 0), z_dir=(-1, 0, 0))):
        with BuildLine():
            Line((8.293246951, 7.809269951), (8.293246951, 7.783904049))
            ThreePointArc((8.293246951, 7.783904049), (9.1682118571, 5.6715519061), (11.280564, 4.796587))
            Line((11.280564, 4.796587), (21.280564, 4.796587))
            ThreePointArc((21.280564, 4.796587), (23.3929161429, 5.6715519061), (24.267881049, 7.783904049))
            Line((24.267881049, 7.783904049), (24.267881049, 7.809269951))
            ThreePointArc((24.267881049, 7.809269951), (23.3929161429, 9.9216220939), (21.280564, 10.796587))
            Line((21.280564, 10.796587), (11.280564, 10.796587))
            ThreePointArc((11.280564, 10.796587), (9.1682118571, 9.9216220939), (8.293246951, 7.809269951))
        make_face()
    extrude(amount=-POCKET010_DEPTH, mode=Mode.SUBTRACT)

    # Fillet004
    fillet004_edges = [part.edges().sort_by_distance(p)[0] for p in [
        (49, -9.168212, 9.921622),
        (49, -9.168212, 5.671552),
        (49, -16.280564, 4.796587),
        (49, -16.280564, 10.796587),
        (49, -23.392916, 9.921622),
        (49, -23.392916, 5.671552),
    ]]
    fillet(fillet004_edges, radius=FILLET004_R)


solid = part.part
